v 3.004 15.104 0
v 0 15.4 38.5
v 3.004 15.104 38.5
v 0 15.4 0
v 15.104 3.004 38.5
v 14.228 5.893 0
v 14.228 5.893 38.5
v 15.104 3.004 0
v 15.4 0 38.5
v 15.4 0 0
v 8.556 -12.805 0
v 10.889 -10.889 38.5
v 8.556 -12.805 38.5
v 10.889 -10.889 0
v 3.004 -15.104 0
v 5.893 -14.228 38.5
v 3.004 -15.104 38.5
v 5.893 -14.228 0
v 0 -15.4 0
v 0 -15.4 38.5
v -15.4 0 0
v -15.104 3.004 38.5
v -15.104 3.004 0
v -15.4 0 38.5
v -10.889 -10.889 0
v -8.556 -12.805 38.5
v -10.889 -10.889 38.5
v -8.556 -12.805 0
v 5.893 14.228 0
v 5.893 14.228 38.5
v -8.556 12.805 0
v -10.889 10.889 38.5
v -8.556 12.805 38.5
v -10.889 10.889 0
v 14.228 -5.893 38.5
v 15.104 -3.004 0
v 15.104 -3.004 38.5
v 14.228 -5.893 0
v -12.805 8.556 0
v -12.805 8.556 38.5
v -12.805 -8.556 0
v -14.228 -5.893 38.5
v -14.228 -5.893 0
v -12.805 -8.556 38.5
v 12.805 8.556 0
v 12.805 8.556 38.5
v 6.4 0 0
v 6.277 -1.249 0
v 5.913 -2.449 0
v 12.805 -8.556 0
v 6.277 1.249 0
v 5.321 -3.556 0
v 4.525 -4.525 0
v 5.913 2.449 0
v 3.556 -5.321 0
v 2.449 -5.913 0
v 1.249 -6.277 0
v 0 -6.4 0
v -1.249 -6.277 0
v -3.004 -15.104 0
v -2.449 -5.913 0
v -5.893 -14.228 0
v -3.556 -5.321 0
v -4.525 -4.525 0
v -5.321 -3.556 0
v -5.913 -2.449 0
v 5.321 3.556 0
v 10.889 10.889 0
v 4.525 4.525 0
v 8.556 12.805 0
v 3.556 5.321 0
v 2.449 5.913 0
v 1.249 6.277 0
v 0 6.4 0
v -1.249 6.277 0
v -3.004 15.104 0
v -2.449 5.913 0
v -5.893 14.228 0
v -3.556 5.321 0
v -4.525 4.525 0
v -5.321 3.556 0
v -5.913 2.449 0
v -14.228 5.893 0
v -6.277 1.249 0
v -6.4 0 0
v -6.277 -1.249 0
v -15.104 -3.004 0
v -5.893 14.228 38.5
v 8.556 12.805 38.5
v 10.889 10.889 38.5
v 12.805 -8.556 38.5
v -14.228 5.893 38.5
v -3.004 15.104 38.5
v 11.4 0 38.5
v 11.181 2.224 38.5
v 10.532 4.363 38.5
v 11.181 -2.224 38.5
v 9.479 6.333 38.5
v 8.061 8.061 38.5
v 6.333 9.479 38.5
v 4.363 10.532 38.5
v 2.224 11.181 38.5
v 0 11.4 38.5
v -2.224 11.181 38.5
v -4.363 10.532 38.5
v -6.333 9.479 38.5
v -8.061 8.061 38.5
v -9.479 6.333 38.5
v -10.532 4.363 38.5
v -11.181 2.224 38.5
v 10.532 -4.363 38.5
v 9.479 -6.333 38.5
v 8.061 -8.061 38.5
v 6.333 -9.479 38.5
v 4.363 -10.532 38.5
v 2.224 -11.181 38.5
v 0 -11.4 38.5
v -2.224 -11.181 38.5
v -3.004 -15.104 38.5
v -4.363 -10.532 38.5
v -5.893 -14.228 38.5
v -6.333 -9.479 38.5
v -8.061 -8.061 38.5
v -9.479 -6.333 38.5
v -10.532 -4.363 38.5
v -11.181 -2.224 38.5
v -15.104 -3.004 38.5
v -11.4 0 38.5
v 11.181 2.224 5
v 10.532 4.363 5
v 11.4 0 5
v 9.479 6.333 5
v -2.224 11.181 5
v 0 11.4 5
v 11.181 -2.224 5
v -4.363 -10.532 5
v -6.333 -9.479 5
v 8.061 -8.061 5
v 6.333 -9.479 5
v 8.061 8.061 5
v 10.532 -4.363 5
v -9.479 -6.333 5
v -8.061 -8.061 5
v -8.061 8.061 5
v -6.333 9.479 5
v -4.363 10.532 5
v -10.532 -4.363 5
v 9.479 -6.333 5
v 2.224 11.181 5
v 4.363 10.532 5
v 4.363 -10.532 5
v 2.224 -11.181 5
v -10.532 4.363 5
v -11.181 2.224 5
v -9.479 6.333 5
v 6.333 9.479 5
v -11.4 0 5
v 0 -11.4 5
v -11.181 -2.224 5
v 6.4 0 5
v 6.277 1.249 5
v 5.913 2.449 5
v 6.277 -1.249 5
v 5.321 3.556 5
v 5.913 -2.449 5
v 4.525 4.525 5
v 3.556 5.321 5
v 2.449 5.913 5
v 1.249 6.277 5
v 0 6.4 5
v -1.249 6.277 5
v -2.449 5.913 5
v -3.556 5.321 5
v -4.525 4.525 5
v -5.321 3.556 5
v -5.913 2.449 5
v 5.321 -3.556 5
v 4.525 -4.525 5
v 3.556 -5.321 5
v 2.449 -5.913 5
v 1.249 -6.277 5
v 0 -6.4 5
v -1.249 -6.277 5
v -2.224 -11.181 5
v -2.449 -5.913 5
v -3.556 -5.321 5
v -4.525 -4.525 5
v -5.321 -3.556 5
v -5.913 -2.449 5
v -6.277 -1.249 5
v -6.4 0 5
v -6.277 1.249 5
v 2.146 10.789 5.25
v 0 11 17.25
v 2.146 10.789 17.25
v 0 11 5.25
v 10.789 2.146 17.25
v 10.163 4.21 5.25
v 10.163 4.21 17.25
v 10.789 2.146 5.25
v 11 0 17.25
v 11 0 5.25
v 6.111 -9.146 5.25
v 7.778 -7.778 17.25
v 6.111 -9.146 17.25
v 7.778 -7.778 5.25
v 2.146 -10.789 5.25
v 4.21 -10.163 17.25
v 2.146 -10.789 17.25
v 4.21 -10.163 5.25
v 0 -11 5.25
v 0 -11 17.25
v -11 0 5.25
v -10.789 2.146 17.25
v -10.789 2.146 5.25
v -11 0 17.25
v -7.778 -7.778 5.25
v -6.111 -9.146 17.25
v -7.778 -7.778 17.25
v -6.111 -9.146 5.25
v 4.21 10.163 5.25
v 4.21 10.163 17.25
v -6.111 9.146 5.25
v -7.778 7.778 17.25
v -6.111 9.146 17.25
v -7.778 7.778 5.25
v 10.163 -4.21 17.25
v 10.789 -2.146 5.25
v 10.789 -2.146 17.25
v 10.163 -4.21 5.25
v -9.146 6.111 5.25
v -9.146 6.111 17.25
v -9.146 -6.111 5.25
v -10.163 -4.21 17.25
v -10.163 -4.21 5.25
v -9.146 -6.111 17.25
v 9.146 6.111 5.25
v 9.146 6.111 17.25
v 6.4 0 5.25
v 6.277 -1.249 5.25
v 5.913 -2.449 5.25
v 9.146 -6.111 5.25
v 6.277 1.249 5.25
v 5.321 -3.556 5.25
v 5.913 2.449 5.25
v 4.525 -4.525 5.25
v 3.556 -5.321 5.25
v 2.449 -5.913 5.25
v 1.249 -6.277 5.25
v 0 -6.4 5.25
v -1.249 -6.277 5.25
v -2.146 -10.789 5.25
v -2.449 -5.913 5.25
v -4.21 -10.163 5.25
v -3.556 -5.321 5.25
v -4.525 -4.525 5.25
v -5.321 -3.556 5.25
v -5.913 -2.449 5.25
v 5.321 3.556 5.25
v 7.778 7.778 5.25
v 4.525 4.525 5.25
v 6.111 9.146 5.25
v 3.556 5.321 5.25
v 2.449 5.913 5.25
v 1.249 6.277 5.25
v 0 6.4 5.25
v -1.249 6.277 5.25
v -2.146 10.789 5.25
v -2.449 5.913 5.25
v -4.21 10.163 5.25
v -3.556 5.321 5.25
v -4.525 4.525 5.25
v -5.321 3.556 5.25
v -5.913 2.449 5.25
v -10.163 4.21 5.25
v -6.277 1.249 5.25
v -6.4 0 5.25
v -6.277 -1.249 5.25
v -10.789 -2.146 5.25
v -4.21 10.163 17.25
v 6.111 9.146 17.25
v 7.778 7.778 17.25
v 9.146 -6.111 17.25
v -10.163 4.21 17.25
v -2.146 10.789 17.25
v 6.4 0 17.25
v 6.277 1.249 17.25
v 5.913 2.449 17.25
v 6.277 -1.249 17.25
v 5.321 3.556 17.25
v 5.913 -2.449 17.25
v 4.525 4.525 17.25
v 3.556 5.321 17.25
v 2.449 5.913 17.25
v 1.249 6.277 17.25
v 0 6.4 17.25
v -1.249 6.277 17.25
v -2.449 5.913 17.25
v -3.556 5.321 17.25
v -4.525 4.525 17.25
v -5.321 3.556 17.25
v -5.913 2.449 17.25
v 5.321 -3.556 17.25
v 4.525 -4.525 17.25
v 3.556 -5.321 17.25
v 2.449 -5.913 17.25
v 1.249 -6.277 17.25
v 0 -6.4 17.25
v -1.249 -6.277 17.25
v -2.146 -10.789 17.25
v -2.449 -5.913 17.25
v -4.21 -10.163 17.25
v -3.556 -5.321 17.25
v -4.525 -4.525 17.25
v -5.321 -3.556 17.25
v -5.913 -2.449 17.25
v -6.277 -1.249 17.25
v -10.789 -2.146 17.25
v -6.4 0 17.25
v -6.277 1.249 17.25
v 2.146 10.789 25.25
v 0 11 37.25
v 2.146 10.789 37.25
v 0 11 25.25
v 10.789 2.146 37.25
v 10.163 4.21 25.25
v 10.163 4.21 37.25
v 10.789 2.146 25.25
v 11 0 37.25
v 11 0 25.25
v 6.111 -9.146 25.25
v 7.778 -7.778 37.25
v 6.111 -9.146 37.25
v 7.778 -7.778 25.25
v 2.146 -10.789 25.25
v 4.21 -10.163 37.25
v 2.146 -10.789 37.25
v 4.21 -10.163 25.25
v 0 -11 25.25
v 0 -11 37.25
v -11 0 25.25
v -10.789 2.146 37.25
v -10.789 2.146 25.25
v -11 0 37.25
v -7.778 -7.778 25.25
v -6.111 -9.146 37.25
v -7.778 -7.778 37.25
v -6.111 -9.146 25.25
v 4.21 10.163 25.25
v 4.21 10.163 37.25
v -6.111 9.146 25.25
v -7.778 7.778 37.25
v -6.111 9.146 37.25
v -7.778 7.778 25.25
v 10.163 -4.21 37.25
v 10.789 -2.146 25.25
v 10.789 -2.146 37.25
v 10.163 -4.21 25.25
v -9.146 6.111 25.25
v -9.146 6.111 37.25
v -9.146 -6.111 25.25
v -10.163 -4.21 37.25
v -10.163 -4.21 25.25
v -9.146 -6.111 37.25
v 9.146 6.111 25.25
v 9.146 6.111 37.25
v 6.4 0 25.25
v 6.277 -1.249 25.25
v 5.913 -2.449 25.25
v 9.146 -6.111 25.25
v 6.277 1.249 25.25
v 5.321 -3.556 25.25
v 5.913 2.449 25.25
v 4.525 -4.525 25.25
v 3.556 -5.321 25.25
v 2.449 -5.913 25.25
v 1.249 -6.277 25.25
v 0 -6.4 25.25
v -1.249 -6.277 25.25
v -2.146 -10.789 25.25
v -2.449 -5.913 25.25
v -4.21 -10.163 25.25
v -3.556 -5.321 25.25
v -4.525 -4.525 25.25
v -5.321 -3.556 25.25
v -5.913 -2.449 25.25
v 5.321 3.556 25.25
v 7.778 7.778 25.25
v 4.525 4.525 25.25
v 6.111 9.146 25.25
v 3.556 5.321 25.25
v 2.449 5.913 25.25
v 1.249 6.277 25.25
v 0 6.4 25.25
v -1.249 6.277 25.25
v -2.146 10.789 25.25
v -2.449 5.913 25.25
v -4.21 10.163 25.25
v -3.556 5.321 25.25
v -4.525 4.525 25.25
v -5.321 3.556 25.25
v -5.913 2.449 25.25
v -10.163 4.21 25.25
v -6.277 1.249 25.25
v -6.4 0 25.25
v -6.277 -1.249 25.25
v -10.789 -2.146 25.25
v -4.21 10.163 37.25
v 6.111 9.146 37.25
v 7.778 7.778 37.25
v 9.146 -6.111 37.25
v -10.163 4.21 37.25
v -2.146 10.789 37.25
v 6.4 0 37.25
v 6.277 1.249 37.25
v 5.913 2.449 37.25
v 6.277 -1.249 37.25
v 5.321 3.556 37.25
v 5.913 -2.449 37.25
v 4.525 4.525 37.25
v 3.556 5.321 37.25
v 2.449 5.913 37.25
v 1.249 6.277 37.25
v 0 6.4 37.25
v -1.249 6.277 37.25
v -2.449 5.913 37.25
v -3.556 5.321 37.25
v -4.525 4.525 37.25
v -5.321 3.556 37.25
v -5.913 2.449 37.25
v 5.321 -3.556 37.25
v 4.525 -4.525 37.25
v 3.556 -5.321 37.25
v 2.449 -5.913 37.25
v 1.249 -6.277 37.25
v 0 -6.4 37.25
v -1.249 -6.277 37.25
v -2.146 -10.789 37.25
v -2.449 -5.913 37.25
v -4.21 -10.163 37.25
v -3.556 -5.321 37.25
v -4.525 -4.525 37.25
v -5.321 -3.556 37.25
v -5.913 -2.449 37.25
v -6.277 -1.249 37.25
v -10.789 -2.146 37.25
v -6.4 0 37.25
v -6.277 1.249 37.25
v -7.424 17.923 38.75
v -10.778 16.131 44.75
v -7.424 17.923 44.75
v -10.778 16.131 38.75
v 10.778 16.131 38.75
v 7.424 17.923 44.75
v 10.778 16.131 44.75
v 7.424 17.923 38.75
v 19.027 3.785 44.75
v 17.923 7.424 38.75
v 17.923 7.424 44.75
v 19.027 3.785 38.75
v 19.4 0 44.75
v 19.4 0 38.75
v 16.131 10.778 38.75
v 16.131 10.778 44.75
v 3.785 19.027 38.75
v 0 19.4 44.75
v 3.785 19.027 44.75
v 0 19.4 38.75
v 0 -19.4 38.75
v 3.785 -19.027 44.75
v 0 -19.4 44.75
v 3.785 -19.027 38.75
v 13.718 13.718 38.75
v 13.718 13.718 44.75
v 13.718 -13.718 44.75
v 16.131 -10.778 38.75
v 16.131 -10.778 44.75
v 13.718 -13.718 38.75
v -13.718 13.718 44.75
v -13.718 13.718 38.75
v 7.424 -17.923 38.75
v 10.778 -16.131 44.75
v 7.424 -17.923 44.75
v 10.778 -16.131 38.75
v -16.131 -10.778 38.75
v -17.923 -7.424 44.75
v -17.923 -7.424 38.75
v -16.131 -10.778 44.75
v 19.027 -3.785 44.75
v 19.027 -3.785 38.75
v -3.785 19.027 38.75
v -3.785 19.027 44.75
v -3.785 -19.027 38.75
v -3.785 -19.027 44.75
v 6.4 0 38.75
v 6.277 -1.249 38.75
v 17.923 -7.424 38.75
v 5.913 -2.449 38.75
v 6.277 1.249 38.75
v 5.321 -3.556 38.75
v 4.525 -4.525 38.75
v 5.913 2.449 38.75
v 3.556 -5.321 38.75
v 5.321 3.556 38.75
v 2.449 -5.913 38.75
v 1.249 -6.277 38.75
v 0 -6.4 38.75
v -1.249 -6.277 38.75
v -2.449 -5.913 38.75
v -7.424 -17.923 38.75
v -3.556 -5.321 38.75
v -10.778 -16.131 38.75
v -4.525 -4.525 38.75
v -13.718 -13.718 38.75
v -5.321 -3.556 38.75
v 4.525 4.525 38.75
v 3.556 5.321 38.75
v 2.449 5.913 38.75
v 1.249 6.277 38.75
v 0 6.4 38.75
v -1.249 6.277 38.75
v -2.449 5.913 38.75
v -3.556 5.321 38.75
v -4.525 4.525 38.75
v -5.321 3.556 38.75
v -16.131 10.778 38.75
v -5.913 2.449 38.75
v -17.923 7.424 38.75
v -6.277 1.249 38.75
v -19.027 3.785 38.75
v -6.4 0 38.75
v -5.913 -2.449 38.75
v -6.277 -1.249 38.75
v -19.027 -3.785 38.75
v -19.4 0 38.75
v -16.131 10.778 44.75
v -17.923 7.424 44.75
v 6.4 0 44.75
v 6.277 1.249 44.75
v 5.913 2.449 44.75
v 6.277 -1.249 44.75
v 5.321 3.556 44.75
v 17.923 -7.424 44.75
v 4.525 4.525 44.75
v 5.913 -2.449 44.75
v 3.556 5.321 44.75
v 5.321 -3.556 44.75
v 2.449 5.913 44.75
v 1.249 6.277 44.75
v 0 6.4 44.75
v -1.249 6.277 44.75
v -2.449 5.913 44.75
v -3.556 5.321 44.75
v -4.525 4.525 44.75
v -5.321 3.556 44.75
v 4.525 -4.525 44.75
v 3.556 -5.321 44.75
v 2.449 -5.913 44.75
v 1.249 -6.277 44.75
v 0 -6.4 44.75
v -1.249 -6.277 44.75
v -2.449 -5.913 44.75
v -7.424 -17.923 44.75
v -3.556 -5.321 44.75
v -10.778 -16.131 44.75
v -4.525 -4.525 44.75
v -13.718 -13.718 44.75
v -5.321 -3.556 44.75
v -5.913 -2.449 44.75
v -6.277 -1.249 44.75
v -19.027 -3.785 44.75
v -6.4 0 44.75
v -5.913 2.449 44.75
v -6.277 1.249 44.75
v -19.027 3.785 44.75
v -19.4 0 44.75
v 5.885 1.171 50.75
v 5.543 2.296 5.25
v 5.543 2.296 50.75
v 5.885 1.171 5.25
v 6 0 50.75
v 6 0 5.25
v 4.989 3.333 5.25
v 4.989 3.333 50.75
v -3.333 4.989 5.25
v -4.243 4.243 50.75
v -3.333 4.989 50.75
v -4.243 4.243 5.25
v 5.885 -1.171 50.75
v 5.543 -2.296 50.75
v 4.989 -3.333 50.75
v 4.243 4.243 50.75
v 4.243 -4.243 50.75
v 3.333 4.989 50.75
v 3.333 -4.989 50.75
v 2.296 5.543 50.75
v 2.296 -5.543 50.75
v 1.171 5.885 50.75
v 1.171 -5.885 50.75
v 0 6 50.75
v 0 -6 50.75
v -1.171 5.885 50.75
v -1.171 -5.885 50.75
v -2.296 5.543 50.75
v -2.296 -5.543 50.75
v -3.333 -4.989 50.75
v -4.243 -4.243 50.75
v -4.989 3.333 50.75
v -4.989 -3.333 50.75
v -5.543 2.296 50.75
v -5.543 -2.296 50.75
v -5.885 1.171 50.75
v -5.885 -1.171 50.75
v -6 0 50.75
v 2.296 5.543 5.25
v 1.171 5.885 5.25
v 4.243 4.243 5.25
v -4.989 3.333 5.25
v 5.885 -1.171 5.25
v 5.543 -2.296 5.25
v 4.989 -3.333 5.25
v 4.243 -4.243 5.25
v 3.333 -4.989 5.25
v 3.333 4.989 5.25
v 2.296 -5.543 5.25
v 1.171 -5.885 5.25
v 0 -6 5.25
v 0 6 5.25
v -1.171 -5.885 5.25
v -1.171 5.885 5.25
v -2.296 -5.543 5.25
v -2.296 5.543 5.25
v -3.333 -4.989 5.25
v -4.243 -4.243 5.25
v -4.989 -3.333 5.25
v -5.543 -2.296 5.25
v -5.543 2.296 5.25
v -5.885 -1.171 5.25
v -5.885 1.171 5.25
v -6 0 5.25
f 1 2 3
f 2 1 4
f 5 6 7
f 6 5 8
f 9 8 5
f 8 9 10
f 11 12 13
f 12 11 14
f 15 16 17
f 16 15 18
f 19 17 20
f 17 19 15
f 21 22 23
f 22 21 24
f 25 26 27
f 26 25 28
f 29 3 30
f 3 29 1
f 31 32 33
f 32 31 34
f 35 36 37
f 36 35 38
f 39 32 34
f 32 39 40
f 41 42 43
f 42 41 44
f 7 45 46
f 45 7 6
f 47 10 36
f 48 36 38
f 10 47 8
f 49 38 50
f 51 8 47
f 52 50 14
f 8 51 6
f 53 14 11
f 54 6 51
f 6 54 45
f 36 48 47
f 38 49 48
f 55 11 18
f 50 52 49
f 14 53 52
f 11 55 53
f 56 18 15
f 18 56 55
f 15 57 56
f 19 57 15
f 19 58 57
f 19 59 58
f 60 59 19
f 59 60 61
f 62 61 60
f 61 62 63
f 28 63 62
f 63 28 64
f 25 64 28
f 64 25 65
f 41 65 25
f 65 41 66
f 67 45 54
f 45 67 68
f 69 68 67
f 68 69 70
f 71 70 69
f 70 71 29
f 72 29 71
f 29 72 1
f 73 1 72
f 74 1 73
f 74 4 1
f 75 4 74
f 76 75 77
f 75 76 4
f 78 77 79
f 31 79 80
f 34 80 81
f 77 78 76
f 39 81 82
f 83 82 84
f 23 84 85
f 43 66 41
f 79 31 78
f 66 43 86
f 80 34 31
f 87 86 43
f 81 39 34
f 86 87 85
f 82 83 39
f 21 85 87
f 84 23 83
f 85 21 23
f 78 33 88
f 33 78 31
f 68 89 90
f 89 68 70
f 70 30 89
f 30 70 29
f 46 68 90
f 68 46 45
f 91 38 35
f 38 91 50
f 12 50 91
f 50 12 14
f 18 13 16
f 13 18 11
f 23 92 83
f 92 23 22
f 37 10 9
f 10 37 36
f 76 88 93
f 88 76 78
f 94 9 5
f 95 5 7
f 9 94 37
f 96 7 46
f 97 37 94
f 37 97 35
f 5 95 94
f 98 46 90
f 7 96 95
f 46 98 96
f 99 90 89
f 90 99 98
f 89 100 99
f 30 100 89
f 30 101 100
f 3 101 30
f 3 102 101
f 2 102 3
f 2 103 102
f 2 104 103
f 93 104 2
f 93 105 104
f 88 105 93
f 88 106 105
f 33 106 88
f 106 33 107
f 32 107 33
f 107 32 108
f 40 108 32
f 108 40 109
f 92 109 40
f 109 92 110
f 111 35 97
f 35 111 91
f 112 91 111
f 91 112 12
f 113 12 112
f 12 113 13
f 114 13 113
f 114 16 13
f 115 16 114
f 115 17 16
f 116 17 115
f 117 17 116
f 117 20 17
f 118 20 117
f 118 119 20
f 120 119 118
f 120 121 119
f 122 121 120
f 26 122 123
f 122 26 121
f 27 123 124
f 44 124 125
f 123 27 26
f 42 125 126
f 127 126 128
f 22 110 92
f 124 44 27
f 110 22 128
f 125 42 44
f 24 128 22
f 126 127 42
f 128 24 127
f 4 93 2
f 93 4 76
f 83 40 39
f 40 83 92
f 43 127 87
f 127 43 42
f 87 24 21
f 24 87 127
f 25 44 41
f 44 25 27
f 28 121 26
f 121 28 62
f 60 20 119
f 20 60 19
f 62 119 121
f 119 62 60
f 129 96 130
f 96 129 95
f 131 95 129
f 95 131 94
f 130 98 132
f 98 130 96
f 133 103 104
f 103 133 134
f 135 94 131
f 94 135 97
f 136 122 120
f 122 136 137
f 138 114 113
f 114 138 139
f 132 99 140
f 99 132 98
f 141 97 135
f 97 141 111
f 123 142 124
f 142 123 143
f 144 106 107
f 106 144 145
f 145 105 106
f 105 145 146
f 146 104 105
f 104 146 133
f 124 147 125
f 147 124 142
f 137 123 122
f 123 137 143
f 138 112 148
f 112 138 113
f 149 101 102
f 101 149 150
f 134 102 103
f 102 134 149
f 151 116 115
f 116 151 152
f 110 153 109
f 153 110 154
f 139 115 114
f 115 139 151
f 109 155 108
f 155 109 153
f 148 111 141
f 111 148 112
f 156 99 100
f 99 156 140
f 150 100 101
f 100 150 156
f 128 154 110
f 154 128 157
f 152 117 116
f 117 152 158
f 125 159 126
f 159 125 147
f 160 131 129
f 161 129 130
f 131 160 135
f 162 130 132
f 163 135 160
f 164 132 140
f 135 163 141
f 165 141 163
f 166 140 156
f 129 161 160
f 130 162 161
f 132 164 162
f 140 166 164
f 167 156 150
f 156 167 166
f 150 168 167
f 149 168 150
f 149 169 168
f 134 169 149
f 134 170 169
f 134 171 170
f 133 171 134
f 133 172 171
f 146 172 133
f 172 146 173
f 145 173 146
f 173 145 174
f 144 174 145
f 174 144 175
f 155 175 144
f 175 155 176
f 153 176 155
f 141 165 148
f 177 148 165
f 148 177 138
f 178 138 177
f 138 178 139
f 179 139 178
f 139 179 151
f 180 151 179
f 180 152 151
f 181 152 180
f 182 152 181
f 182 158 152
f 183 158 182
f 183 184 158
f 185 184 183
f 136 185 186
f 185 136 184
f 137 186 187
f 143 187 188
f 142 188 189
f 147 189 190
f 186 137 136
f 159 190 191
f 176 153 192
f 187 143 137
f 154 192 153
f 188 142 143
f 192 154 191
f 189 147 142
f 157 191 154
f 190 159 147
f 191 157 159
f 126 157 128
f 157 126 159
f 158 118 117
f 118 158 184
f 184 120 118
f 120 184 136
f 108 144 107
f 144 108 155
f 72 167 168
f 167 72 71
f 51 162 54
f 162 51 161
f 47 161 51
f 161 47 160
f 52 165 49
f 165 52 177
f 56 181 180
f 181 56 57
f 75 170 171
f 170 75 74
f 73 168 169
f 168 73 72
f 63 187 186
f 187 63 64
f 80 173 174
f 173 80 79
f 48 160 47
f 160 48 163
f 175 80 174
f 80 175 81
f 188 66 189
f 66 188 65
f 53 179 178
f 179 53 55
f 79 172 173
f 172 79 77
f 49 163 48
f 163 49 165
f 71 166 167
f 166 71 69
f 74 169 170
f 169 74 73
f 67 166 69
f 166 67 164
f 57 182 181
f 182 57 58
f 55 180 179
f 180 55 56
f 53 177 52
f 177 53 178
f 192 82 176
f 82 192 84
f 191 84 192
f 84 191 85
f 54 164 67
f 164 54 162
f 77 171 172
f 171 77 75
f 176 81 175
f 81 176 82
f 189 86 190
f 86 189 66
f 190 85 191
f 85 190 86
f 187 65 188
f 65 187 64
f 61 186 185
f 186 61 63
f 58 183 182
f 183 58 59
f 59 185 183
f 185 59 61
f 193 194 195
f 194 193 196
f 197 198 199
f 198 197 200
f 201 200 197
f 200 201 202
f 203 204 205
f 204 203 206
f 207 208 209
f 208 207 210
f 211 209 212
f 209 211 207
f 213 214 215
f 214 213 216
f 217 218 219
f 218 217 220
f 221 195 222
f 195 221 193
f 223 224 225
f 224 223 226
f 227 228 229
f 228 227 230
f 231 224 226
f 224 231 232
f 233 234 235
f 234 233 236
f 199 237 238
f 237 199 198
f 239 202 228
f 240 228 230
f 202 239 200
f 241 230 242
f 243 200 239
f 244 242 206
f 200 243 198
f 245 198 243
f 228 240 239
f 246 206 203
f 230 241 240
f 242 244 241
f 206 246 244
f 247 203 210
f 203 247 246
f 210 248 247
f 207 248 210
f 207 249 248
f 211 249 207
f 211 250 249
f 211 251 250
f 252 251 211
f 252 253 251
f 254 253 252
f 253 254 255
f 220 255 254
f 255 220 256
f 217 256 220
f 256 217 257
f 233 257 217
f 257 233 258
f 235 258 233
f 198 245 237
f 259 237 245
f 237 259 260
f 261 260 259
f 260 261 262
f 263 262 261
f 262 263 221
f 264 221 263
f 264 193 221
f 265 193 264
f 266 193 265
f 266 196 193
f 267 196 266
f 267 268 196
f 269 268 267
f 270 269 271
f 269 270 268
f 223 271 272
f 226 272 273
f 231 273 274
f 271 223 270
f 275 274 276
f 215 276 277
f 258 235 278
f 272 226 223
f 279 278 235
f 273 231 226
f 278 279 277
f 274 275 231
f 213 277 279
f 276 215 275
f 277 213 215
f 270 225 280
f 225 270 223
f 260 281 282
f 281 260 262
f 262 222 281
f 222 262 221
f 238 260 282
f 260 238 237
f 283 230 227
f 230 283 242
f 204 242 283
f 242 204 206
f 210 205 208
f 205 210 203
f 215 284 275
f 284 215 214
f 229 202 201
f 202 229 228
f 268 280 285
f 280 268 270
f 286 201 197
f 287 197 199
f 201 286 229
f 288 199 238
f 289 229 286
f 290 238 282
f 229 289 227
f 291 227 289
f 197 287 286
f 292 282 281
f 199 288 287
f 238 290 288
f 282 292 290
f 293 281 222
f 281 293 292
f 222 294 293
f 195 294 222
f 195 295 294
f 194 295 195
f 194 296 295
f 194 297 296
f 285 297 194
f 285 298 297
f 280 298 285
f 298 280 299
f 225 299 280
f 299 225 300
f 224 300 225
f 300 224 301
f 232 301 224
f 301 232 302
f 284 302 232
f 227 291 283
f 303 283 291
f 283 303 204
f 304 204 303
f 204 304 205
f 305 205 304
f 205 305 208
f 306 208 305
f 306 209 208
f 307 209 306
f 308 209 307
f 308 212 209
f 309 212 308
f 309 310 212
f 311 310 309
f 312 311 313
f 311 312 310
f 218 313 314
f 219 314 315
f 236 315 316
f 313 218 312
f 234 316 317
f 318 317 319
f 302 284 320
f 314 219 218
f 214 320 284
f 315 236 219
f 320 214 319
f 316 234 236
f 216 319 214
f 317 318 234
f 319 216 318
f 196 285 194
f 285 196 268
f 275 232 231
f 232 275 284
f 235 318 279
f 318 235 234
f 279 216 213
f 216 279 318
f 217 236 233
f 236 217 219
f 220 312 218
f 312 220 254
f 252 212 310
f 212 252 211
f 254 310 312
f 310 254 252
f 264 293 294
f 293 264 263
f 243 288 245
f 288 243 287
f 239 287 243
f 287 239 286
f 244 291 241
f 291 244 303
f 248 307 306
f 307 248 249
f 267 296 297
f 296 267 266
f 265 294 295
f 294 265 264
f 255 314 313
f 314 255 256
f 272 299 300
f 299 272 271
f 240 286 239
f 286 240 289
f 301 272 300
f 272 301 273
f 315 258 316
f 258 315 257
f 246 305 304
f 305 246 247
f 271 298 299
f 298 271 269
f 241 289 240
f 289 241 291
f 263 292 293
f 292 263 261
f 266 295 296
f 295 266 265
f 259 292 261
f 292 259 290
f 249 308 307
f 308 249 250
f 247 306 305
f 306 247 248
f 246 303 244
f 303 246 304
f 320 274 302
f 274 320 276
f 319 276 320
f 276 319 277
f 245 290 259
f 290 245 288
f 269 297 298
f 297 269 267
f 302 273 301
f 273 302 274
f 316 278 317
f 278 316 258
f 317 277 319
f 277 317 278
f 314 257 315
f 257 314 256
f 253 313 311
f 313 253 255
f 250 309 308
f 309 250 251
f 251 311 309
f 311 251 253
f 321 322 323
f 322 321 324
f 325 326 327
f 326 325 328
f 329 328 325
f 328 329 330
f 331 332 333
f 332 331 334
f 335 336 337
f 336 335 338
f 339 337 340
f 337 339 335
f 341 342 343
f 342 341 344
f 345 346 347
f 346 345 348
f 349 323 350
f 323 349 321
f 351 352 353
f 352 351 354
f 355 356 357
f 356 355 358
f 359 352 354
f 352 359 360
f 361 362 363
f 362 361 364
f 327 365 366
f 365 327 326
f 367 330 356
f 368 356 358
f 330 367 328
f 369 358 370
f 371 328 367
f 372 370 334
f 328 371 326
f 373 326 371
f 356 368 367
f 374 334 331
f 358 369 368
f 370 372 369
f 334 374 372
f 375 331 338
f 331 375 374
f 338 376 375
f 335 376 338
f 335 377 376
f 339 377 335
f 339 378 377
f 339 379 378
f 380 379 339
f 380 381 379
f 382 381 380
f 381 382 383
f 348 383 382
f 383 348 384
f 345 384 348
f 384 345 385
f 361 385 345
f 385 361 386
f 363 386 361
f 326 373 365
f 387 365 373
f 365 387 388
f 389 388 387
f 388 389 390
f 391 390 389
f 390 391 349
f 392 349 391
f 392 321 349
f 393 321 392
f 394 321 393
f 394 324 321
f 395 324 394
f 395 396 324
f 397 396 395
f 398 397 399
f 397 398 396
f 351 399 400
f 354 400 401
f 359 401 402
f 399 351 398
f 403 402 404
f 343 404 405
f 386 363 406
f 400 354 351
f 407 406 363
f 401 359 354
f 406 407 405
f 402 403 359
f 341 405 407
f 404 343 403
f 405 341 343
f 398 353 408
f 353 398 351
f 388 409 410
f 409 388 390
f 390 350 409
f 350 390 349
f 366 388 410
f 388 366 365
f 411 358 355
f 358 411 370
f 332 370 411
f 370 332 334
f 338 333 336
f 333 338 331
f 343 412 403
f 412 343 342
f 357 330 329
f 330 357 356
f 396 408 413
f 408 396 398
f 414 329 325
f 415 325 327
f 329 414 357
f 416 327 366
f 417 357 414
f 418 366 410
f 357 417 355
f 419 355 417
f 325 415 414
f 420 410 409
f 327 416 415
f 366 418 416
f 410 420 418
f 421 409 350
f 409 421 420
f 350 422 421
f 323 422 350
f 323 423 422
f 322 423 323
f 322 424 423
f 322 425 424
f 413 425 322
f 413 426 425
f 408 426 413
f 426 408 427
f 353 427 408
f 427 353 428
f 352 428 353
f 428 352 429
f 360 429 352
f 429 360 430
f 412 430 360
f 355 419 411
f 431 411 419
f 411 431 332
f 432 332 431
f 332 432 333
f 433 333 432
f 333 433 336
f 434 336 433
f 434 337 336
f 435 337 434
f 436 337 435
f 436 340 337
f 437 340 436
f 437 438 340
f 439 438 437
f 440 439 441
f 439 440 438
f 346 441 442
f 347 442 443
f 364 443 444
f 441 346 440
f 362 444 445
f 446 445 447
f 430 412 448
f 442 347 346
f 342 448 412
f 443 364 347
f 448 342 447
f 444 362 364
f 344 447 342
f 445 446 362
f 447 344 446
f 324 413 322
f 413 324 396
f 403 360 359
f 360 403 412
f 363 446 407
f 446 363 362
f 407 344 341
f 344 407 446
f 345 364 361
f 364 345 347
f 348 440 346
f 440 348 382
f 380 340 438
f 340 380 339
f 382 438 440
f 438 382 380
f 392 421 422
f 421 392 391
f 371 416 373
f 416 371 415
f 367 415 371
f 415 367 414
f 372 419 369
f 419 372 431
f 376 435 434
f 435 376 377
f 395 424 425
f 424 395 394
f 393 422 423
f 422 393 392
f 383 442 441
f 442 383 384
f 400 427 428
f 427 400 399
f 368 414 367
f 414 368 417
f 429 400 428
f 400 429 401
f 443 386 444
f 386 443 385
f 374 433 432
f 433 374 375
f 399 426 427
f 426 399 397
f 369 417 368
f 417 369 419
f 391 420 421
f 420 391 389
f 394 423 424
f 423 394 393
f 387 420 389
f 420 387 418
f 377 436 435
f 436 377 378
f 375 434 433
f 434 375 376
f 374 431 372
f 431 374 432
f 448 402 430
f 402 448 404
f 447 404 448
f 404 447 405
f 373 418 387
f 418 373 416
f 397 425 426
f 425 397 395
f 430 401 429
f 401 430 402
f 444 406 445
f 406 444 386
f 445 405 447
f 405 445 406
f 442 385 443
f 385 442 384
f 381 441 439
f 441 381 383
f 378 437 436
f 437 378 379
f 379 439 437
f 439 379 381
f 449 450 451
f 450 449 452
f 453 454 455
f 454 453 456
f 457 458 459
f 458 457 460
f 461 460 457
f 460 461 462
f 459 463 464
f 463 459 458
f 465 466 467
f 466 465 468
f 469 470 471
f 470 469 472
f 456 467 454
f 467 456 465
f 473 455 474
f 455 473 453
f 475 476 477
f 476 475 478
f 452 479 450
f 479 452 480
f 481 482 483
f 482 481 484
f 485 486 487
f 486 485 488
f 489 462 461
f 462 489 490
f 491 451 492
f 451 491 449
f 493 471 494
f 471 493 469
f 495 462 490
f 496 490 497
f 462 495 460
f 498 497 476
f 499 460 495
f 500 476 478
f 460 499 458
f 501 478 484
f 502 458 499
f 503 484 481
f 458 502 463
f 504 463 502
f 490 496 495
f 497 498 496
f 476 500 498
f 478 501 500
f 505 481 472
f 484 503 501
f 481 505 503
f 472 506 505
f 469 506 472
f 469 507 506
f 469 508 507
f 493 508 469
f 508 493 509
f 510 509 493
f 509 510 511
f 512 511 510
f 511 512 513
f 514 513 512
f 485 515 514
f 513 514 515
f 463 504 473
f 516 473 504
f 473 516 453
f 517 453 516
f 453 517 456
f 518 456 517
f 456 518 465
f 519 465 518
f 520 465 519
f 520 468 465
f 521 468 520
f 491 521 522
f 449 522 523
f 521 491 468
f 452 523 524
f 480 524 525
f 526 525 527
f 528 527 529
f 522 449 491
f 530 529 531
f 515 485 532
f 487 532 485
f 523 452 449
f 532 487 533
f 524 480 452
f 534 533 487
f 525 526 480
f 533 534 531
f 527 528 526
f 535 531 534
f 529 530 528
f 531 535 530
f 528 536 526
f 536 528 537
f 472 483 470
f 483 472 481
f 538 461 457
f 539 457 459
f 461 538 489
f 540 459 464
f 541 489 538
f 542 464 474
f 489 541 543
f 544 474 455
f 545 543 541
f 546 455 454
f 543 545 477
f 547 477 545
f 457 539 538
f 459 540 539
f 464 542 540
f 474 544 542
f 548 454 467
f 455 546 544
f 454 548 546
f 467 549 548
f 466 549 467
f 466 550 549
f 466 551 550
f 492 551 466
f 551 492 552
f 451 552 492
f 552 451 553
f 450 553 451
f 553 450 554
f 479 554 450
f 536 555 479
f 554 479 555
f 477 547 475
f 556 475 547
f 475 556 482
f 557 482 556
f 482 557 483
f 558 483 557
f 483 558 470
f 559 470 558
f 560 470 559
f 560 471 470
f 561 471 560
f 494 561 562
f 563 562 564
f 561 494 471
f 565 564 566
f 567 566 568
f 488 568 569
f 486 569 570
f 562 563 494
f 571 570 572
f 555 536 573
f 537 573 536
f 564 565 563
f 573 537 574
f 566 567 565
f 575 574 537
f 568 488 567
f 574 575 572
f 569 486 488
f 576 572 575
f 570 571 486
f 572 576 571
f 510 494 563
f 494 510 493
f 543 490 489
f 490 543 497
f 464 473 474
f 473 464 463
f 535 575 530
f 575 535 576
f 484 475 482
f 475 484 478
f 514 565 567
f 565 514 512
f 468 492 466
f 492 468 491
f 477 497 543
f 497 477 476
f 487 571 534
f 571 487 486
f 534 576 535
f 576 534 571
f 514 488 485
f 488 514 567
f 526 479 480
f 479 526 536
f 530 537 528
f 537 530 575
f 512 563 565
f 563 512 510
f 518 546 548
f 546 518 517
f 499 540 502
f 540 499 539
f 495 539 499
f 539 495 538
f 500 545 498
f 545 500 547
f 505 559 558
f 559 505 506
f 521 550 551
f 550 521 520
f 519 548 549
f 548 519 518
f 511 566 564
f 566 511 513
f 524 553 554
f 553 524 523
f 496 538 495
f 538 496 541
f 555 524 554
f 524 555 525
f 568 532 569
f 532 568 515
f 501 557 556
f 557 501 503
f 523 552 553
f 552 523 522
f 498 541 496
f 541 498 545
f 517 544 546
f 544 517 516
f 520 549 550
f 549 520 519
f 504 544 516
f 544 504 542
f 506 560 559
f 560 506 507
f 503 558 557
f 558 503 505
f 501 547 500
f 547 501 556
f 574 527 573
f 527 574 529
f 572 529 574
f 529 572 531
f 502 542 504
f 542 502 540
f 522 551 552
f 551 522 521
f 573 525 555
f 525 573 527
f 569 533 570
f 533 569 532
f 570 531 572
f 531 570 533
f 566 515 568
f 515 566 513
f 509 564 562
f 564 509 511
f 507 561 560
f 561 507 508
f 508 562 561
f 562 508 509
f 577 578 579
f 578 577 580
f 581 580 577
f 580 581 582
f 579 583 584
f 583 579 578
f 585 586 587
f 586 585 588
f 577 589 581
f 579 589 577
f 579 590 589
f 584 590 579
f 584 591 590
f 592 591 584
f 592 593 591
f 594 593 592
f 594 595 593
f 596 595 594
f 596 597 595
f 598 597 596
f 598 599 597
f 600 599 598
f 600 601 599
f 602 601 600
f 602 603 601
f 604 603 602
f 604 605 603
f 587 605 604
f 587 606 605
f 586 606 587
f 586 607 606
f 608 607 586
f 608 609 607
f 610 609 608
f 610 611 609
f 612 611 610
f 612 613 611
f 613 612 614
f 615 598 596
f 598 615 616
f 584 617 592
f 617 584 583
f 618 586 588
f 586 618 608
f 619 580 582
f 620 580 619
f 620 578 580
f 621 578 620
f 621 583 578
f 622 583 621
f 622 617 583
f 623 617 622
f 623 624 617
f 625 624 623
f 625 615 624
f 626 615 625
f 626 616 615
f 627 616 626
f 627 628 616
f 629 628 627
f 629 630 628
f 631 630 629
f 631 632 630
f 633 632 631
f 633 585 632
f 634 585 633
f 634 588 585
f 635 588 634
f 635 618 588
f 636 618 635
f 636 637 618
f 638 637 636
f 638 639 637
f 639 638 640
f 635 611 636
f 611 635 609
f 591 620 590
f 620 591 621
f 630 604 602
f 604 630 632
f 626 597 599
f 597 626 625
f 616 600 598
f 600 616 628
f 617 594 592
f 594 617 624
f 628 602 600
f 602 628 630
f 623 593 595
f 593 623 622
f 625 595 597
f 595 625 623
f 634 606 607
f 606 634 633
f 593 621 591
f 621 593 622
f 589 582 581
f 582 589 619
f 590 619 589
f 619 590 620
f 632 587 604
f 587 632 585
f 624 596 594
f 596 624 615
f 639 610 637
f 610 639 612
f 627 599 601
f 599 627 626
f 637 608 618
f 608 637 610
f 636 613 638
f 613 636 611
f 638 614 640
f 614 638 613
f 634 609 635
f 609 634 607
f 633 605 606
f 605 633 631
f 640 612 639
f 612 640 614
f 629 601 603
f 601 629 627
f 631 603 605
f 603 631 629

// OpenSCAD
$fn = 32;

// ------------------------------------------------------------------------
// Shaft station: cup d30.8 x 38.5 mm, shaft d12
// Every part is its own module, assembly() places every instance.
// ------------------------------------------------------------------------

// --- part 1 ---
module housing_cup() {
  difference() {
    cylinder(h = 38.5, d = 30.8);
    translate([0, 0, 5]) cylinder(h = 34.5, d = 22.8);
    translate([0, 0, -1]) cylinder(h = 7, d = 12.8);
  }
}

// --- part 2 ---
module bearing_lower() {
  difference() {
      translate([0, 0, 0]) cylinder(h = 12, d = 22);
      translate([0, 0, -1]) cylinder(h = 14, d = 12.8);
    }
}

// --- part 3 ---
module bearing_upper() {
  difference() {
      translate([0, 0, 0]) cylinder(h = 12, d = 22);
      translate([0, 0, -1]) cylinder(h = 14, d = 12.8);
    }
}

// --- part 4 ---
module station_shaft() {
  translate([0, 0, -22.75]) cylinder(h = 45.5, d = 12);
}

// --- part 5 ---
module station_cover() {
  difference() {
    cylinder(h = 6, d = 38.8);
    translate([0, 0, -1]) cylinder(h = 8, d = 12.8);
  }
}

// --- assembly ---
module assembly() {
  color([0.80, 0.24, 0.20]) translate([0, 0, 0]) rotate([0, 0, 0]) housing_cup();
  color([0.20, 0.45, 0.75]) translate([0, 0, 5.25]) rotate([0, 0, 0]) bearing_lower();
  color([0.25, 0.62, 0.32]) translate([0, 0, 25.25]) rotate([0, 0, 0]) bearing_upper();
  color([0.92, 0.70, 0.18]) translate([0, 0, 28]) rotate([0, 0, 0]) station_shaft();
  color([0.58, 0.35, 0.70]) translate([0, 0, 38.75]) rotate([0, 0, 0]) station_cover();
}

assembly();
